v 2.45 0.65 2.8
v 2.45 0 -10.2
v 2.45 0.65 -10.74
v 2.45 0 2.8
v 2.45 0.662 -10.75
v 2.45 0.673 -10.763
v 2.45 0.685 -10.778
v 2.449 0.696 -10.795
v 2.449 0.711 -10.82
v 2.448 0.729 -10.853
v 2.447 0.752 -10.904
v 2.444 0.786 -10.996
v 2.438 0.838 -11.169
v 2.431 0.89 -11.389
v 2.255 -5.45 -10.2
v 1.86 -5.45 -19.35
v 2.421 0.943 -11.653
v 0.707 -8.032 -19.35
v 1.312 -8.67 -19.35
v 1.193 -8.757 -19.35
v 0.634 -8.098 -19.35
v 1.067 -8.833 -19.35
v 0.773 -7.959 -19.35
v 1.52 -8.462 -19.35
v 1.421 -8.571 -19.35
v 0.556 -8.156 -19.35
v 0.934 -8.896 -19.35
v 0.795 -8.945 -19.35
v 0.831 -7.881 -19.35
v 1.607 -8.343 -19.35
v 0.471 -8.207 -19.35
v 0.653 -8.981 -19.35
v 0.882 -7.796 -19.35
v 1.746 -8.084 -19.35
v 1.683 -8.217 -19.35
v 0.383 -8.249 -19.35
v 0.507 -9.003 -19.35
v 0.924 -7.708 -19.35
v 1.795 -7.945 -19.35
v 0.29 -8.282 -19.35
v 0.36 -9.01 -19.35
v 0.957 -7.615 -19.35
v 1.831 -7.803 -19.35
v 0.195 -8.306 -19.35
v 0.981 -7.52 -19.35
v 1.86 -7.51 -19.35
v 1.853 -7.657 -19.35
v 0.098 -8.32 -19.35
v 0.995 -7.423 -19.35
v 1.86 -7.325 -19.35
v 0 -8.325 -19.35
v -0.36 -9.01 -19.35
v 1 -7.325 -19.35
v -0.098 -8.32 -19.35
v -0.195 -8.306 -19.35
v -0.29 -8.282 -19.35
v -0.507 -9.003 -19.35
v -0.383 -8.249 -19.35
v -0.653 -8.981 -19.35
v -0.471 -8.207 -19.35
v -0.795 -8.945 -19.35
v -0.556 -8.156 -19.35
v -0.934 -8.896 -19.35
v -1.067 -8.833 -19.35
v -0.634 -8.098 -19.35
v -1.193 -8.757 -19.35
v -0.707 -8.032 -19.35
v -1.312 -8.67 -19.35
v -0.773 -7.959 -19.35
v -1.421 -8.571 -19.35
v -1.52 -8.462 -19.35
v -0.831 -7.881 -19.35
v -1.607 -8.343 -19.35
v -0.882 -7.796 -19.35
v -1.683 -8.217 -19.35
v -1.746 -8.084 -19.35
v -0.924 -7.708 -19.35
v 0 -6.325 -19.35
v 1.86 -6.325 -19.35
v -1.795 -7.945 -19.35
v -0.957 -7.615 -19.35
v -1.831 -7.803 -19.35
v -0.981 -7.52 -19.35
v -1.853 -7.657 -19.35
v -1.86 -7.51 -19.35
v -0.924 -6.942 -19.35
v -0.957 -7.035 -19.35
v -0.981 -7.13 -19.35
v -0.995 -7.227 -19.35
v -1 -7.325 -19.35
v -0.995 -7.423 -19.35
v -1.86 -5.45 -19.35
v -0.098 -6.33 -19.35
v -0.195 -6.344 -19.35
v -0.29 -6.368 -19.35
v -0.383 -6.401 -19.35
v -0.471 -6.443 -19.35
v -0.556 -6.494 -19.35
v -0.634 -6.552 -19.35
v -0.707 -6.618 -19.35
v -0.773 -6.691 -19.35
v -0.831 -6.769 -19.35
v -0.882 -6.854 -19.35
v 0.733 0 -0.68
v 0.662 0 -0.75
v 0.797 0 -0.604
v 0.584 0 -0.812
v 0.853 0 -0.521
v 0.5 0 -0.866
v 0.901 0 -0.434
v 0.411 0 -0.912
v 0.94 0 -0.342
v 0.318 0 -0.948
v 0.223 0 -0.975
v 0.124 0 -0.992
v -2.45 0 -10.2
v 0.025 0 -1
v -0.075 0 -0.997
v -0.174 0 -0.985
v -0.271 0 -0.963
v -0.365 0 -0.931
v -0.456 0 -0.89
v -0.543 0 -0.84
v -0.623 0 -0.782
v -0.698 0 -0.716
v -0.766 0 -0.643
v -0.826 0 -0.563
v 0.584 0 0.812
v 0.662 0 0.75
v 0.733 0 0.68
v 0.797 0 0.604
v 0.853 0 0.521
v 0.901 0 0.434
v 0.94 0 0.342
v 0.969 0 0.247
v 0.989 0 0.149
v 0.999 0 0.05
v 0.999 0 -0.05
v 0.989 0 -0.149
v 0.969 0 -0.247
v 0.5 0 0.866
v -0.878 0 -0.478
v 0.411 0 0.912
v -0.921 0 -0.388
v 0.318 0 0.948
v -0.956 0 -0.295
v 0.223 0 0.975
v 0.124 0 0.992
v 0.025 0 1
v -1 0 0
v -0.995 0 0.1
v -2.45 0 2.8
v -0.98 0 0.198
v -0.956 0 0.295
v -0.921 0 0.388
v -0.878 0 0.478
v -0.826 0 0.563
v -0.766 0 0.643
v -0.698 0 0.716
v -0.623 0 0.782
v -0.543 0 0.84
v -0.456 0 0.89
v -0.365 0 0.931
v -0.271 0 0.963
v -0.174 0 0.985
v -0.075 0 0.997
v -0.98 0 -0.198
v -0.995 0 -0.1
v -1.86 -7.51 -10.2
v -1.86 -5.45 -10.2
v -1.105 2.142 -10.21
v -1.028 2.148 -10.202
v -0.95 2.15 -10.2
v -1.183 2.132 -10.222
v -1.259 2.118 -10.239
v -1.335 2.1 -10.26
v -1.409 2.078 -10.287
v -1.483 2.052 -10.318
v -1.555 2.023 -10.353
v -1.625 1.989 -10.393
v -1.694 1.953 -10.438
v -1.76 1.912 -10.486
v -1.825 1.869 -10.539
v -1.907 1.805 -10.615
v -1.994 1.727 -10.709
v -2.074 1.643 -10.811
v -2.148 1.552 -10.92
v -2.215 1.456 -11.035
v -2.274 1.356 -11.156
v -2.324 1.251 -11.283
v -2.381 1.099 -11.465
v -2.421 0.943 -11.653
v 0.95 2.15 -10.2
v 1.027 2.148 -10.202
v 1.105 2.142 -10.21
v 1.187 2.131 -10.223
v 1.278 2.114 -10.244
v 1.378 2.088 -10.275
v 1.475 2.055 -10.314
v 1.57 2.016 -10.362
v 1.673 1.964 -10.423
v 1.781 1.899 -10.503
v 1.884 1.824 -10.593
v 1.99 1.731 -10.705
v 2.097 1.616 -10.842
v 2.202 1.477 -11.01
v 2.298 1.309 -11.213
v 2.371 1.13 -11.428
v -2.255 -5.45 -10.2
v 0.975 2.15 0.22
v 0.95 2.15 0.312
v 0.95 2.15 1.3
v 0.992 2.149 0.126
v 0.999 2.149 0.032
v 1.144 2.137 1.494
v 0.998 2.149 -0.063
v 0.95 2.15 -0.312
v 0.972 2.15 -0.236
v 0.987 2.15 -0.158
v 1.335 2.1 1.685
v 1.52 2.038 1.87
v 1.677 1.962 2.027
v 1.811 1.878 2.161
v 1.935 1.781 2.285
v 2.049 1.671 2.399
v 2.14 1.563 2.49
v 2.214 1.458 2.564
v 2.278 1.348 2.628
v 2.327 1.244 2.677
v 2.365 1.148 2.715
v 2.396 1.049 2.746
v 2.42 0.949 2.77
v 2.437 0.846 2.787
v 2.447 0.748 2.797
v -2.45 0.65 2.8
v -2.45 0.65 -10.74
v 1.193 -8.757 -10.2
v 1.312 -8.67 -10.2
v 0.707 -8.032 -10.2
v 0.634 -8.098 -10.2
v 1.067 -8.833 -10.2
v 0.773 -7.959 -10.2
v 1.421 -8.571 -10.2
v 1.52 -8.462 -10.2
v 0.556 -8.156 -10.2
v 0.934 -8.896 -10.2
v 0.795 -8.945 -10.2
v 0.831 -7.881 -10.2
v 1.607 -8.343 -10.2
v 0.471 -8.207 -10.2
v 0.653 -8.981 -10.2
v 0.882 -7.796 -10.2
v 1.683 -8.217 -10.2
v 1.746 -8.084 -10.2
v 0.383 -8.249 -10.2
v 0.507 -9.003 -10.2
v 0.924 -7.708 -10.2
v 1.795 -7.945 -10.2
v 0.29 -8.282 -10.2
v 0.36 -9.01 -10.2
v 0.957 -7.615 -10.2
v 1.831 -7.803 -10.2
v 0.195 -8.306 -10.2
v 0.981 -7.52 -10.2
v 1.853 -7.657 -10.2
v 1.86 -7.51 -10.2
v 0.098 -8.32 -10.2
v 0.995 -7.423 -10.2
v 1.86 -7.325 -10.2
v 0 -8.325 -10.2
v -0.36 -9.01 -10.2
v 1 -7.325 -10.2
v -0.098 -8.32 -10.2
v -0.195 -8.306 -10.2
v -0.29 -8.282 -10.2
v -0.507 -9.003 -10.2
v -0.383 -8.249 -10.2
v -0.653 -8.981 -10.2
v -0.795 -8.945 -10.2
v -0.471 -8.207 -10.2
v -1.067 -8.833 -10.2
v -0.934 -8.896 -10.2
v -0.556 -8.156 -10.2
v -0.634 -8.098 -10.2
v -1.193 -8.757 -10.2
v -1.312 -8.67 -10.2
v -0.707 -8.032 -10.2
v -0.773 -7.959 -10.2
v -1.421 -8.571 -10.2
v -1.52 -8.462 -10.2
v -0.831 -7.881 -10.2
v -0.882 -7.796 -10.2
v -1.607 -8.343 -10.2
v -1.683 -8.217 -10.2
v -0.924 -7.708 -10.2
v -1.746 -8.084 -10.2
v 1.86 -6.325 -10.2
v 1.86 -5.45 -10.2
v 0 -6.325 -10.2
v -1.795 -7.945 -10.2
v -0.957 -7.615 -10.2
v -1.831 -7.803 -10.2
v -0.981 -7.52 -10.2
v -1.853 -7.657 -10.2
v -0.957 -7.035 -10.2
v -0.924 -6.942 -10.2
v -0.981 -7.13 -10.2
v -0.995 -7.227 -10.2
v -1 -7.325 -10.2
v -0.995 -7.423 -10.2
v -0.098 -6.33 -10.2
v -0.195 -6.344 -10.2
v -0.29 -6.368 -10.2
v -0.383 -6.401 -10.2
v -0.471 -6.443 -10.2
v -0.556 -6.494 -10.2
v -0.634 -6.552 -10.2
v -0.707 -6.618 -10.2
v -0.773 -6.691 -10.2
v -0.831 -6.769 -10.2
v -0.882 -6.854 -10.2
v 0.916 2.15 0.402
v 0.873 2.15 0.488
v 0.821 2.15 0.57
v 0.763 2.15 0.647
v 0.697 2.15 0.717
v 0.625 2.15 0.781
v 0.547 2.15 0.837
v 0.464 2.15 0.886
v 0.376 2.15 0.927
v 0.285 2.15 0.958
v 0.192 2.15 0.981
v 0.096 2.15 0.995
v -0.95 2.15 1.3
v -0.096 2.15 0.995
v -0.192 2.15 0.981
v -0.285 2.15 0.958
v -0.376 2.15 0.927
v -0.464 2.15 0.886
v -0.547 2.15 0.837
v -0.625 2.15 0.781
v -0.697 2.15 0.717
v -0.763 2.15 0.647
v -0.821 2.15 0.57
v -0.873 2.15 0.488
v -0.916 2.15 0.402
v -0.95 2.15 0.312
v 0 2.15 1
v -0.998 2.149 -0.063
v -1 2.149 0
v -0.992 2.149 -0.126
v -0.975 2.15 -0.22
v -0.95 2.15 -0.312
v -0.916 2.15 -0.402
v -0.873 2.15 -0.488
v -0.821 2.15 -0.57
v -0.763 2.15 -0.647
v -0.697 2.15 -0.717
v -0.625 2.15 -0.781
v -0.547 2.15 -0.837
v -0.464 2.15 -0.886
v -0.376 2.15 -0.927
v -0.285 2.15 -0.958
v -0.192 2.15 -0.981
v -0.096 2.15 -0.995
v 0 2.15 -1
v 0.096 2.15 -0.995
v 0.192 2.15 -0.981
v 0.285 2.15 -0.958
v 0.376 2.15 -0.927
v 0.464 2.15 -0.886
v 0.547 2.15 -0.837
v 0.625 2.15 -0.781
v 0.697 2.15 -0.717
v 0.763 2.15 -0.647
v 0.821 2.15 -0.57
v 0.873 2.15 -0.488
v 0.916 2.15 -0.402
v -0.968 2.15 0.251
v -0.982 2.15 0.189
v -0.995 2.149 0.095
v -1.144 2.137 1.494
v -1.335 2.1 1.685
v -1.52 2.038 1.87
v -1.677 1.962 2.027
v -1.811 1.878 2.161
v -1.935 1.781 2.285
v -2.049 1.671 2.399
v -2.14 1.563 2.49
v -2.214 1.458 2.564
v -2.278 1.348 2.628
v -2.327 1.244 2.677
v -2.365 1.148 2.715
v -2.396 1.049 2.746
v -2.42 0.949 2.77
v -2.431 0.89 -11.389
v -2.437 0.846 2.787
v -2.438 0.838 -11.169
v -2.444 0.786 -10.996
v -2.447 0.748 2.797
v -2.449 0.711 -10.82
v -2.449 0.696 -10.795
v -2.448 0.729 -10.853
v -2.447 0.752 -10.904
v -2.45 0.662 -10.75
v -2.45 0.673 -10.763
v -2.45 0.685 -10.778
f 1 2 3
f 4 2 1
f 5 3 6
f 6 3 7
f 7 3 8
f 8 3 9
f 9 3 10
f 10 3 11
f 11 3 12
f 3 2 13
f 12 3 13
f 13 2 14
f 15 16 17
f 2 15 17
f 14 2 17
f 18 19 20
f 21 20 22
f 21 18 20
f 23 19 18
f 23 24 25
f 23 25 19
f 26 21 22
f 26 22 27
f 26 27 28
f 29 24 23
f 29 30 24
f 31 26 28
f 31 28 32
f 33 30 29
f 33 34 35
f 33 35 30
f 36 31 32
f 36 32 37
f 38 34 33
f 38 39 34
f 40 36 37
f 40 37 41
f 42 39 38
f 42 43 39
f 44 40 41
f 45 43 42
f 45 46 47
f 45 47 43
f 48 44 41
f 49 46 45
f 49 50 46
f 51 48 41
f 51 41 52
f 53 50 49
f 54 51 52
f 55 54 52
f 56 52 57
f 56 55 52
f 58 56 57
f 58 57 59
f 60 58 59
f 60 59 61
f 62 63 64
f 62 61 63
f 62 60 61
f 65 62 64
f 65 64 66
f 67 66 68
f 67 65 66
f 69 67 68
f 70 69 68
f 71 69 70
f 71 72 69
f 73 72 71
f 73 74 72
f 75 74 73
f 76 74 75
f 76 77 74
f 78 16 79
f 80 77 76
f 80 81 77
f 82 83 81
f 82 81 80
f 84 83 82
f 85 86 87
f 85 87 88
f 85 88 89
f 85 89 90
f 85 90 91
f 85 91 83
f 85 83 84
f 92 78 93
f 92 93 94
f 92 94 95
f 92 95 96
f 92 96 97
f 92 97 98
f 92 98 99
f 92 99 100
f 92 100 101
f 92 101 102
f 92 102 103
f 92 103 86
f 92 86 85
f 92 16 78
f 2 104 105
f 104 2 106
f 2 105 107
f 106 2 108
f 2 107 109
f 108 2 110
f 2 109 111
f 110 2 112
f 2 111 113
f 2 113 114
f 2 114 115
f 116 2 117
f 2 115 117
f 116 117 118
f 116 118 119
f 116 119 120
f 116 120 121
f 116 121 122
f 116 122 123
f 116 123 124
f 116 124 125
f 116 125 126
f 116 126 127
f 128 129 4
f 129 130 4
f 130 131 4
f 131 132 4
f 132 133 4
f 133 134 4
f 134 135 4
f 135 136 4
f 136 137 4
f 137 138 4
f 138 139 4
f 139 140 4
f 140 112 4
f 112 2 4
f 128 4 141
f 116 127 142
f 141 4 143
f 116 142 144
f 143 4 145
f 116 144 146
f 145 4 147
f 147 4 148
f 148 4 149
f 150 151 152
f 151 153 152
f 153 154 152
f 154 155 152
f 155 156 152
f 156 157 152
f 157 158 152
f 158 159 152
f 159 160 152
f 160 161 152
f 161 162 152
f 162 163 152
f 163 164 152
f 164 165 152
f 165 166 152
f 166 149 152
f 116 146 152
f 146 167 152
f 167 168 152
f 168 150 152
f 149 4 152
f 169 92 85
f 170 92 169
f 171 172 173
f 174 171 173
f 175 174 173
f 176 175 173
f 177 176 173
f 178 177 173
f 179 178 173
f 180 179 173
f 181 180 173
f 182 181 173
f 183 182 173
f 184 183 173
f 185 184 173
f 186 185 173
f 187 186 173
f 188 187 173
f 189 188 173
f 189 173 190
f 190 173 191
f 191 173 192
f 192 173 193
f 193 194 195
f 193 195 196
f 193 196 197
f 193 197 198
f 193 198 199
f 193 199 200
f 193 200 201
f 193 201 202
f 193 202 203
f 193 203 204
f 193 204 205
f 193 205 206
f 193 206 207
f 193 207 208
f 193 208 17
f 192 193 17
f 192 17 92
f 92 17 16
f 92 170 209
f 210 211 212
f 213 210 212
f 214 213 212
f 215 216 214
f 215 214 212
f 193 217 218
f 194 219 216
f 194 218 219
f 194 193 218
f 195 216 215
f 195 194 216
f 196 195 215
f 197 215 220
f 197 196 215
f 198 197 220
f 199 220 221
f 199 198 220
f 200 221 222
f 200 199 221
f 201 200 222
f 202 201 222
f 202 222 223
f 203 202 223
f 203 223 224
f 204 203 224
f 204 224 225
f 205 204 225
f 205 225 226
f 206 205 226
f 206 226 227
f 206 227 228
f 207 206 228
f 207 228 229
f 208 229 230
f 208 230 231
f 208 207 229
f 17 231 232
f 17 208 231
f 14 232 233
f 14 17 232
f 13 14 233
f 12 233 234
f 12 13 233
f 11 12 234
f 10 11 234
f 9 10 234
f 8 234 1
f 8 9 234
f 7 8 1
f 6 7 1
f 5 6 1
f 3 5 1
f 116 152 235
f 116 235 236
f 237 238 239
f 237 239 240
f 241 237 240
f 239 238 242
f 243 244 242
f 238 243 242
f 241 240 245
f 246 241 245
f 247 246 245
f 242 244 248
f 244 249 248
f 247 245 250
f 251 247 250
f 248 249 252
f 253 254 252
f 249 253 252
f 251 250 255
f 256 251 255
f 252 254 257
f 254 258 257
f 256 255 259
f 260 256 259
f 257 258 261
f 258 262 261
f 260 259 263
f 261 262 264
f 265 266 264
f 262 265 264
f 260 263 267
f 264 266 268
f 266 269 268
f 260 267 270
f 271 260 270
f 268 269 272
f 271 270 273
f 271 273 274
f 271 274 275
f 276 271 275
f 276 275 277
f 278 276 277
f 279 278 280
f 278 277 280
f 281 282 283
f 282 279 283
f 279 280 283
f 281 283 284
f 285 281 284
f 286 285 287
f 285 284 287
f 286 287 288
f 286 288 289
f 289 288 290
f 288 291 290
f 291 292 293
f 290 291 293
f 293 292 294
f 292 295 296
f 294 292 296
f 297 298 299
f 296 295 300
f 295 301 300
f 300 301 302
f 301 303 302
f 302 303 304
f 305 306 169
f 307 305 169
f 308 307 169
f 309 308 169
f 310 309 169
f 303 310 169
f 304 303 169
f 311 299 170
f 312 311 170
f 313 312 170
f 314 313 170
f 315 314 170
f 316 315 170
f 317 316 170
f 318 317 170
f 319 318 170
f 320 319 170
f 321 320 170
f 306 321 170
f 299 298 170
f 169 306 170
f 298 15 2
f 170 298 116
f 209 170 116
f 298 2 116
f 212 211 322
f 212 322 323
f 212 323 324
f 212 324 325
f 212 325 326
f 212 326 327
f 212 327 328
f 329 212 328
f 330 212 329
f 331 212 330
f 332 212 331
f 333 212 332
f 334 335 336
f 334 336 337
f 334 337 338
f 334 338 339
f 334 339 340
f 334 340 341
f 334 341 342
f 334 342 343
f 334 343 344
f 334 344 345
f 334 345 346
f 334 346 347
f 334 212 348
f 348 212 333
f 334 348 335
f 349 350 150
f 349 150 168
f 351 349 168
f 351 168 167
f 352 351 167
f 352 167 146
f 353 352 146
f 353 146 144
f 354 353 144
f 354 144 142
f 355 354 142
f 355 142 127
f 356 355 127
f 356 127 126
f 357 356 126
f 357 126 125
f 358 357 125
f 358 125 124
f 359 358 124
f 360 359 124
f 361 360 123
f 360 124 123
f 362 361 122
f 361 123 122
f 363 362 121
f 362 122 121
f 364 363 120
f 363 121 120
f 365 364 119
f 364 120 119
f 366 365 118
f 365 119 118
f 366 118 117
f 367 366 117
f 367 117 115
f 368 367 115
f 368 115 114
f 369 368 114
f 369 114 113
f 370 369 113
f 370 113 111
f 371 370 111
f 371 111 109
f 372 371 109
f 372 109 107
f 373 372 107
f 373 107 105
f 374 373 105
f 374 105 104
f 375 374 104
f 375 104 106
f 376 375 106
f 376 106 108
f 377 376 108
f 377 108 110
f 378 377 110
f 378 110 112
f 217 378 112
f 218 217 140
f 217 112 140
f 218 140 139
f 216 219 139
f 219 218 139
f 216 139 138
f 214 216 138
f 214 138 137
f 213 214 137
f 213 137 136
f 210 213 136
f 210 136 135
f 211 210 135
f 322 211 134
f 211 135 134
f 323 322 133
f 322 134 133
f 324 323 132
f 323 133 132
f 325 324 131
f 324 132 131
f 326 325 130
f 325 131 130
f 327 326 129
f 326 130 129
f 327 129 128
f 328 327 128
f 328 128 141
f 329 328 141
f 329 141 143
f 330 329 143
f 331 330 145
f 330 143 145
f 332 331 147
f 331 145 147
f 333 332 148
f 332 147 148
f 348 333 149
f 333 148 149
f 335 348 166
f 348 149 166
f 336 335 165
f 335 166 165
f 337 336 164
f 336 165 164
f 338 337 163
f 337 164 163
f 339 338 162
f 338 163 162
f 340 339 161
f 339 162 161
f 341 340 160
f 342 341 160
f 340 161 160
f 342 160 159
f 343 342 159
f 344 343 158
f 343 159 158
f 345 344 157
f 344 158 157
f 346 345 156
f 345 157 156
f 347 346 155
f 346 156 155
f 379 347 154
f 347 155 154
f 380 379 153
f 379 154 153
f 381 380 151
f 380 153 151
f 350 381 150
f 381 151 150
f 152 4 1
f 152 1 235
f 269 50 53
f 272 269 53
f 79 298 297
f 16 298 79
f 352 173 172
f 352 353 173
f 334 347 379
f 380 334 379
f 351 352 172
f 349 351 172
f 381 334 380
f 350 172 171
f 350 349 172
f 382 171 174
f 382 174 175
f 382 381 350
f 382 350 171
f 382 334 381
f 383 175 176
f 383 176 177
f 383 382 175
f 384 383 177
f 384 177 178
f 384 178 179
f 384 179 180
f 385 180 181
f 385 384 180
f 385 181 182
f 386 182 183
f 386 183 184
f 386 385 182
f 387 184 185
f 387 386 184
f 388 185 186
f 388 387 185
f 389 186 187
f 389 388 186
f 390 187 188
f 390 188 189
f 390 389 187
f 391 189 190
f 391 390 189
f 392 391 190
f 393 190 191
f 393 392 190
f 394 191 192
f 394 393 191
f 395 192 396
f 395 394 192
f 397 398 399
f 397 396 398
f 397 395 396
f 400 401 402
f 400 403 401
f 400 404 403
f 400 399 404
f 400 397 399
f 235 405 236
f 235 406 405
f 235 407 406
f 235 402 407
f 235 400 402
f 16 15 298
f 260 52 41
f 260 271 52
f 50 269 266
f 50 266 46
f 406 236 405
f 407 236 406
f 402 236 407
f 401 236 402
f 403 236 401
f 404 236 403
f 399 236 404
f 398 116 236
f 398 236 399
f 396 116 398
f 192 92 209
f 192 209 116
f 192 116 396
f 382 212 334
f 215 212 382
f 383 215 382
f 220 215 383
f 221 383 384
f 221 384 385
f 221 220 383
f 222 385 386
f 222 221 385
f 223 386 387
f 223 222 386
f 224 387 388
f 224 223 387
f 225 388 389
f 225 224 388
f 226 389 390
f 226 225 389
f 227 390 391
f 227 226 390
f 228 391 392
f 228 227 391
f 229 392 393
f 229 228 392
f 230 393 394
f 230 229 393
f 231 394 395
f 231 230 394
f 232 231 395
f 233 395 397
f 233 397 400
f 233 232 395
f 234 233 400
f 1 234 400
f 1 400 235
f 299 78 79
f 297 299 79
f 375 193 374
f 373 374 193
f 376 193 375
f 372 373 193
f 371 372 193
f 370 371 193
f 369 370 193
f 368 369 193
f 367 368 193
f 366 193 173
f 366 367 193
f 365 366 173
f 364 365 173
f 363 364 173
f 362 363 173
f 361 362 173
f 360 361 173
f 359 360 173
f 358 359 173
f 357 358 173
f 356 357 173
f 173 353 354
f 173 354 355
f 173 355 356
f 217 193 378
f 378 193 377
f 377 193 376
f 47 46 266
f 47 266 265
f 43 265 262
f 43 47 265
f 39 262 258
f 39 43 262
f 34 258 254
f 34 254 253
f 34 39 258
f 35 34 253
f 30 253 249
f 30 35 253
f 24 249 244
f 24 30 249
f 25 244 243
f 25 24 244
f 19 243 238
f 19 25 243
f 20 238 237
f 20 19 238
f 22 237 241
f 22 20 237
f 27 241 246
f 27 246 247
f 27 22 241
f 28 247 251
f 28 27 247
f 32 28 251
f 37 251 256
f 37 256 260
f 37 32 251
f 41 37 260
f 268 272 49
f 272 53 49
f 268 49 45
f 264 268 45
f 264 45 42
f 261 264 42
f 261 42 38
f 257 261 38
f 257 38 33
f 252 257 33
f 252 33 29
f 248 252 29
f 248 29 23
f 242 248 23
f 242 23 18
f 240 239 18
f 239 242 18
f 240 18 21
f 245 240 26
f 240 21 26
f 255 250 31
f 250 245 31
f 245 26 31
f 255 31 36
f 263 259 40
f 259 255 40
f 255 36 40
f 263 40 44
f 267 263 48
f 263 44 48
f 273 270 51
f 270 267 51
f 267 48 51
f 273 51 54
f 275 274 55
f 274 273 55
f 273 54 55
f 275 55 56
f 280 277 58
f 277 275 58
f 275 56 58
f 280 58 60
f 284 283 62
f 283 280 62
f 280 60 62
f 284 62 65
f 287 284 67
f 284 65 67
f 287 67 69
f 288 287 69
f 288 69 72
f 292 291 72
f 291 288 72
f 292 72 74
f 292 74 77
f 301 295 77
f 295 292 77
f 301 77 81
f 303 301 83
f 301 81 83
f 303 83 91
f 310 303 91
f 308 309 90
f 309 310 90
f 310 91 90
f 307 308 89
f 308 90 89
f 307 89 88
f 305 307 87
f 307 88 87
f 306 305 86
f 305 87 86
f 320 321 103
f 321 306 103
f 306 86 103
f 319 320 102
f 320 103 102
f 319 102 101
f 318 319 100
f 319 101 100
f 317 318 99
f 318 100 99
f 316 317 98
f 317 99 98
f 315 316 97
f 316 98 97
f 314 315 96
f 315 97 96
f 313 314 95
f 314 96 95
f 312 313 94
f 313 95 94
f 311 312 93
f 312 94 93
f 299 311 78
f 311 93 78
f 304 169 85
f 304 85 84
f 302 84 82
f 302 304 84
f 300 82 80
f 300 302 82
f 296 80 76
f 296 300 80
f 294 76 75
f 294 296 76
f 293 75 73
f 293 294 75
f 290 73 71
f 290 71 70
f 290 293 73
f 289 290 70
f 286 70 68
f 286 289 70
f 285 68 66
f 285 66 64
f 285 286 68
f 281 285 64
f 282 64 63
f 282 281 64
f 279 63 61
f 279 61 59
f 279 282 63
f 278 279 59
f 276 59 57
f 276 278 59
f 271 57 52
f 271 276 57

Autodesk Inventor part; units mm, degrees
ref_plane "YZ Plane" through (0, 0, 0) normal (1, 0, 0) x (0, 1, 0)
ref_plane "XZ Plane" through (0, 0, 0) normal (0, 1, 0) x (-1, 0, 0)
ref_plane "XY Plane" through (0, 0, 0) normal (0, 0, 1) x (1, 0, 0)
sketch "Sketch1" plane through (0, 0, 0) normal (0, 1, 0) x (-1, 0, 0)
  circle A0 centre (0, 0) radius 1
  line L0 (0, 1) -> (0, 2.8)
  line L1 (-2.45, 2.8) -> (2.45, 2.8)
  line L2 (2.45, 2.8) -> (2.45, -10.2)
  line L3 (2.45, -10.2) -> (-2.45, -10.2)
  line L4 (-2.45, -10.2) -> (-2.45, 2.8)
  dimension "d0" = 2
  dimension "d1" = 1.8
  dimension "d2" = 4.9
  dimension "d3" = 13
extrude "Extrusion1" add sketch "Sketch1" along normal blind 2.15
sketch "Sketch2" plane through (2.45, 0, 2.8) normal (1, 0, 0) x (0, 0, -1)
  line L0 (0, 0) -> (13, 0) projected
  line L1 (13, 2.15) -> (13, -5.45)
  line L2 (13, -5.45) -> (22.15, -5.45)
  line L3 (13, 2.15) -> (22.15, -5.45)
  point P0 (2.8, 0)
  dimension "d6" = 7.6
  dimension "d7" = 9.15
extrude "Extrusion2" add sketch "Sketch2" against normal up to surface (4.9 mm away)
sketch "Sketch3" plane through (-2.45, 2.15, -10.2) normal (0, 0.7692539, -0.6389432) x (1, 0, 0)
  line L0 (4.31, 11.8946) -> (0.59, 11.8946)
  line L1 (4.9, 11.8946) -> (0, 11.8946) projected
  line L2 (4.9, -8.6266) -> (4.9, 1.3737) projected
  line L3 (4.31, 11.8946) -> (4.9, 1.3737)
  line L4 (0, 1.3737) -> (0, -8.6266) projected
  line L5 (0.59, 11.8946) -> (0, 1.3737)
  line L6 (4.9, 1.3737) -> (0, 1.3737) projected
  line L7 (4.9, 1.3737) -> (4.9, 11.8946)
  line L8 (4.9, 11.8946) -> (4.31, 11.8946)
  line L9 (0.59, 11.8946) -> (0, 11.8946)
  line L10 (0, 11.8946) -> (0, 1.3737)
  point P0 (2.45, -6.4727)
  point P1 (2.45, 11.8946)
  point P2 (0.59, 11.8946)
  point P3 (4.31, 11.8946)
  dimension "d10" = 3.72
extrude "Extrusion3" cut sketch "Sketch3" against normal blind 10 contours L1 L7 L3 | L5 L10 L1
sketch "Sketch4" plane through (-2.2547, -5.45, -10.2) normal (0, -1, 0) x (1, 0, 0)
  line L0 (4.1147, -9.15) -> (0.3947, -9.15) projected
  line L1 (4.7047, 0) -> (-0.1953, 0) projected
  line L2 (4.1147, -9.15) -> (0.3947, -9.15)
  line L3 (0.3947, -9.15) -> (0.3947, 0)
  line L4 (0.3947, 0) -> (4.1147, 0)
  line L5 (4.1147, 0) -> (4.1147, -9.15)
  point P0 (2.2547, 10.2)
  dimension "d13" = 3.72
extrude "Extrusion4" add sketch "Sketch4" along normal blind 3.56
fillet "Fillet1" radius 1.5 2 edges at (1.86, -9.01, -14.775) (-1.86, -9.01, -14.775)
sketch "Sketch5" plane through (1.86, -5.45, -19.35) normal (0, 0, -1) x (-1, 0, 0)
  circle A0 centre (1.86, -1.875) radius 1
  line L0 (1.86, -0.875) -> (-0.4108, -0.875)
  line L1 (-0.4108, -0.875) -> (-0.4108, -1.875)
  line L2 (-0.4108, -1.875) -> (0.86, -1.875)
  point P0 (1.86, 5.45)
  dimension "d17" = 2
extrude "Extrusion5" cut sketch "Sketch5" against normal through all contours A0
sketch "Sketch6" plane through (1.86, -5.45, -19.35) normal (0, 0, -1) x (-1, 0, 0)
  point P0 (1.86, 5.45)
extrude "Extrusion6" cut sketch "Sketch5" against normal through all contours A0 L2 L1 L0
fillet "Fillet2" radius 1.5 3 edges at (2.45, 2.15, -3.7) (-2.45, 2.15, -3.7) (0, 2.15, 2.8)
